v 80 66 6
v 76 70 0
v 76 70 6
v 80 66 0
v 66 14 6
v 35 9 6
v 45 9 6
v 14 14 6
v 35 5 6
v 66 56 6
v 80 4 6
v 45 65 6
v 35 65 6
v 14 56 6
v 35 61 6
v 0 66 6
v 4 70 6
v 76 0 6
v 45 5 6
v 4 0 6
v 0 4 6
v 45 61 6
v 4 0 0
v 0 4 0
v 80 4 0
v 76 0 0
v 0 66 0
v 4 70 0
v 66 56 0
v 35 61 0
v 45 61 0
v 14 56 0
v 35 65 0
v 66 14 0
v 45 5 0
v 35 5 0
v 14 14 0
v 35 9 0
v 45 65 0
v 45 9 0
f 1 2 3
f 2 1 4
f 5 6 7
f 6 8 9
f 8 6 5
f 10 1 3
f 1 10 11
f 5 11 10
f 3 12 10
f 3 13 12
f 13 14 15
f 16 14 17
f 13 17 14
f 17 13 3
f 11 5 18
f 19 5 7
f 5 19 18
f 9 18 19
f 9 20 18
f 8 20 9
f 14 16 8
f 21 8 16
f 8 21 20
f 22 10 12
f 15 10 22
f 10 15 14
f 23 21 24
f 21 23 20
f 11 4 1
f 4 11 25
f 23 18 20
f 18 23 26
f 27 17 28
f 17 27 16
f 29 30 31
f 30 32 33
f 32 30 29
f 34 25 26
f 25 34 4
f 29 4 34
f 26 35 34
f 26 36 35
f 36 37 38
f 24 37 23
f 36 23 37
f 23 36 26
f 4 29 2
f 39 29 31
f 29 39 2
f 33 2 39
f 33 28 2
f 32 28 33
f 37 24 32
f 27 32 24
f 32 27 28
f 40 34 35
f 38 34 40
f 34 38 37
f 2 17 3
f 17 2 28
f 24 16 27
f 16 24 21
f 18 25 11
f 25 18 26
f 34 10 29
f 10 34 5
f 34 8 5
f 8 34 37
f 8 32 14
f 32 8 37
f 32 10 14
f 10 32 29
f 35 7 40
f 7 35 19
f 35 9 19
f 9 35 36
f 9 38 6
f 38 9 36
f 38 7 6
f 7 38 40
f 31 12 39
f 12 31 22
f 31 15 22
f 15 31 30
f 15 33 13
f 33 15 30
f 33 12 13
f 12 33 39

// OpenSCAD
$fn = 32;

// ----------------------------------------------------------------------
// Frame plate: 80 x 70 frame, 14 mm rails
// ----------------------------------------------------------------------

// --- parameters (mm) ---
plate_l = 80;             // plate length, X
plate_w = 70;             // plate width, Y
plate_t = 6;              // plate thickness, Z (extrusion height)
corner_c = 4;             // corner chamfer
frame_bar = 14;           // frame rail width
slot_l = 10;              // adjustment slot length
slot_w = 4;               // adjustment slot width

win_l = plate_l - 2 * frame_bar;  // window length
win_w = plate_w - 2 * frame_bar;  // window width

profile = [[4, 0], [76, 0], [80, 4], [80, 66], [76, 70], [4, 70], [0, 66], [0, 4]];  // primary outline, 8 points, counter clockwise
void_1 = [[14, 14], [66, 14], [66, 56], [14, 56]];  // the window, 4 points
void_2 = [[35, 5], [45, 5], [45, 9], [35, 9]];  // adjustment slot, 4 points
void_3 = [[35, 61], [45, 61], [45, 65], [35, 65]];  // adjustment slot, 4 points

// --- the one profile operation ---
difference() {
  linear_extrude(height = plate_t) polygon(points = profile);
  translate([0, 0, -1])
    linear_extrude(height = plate_t + 2) polygon(points = void_1);
  translate([0, 0, -1])
    linear_extrude(height = plate_t + 2) polygon(points = void_2);
  translate([0, 0, -1])
    linear_extrude(height = plate_t + 2) polygon(points = void_3);
}
